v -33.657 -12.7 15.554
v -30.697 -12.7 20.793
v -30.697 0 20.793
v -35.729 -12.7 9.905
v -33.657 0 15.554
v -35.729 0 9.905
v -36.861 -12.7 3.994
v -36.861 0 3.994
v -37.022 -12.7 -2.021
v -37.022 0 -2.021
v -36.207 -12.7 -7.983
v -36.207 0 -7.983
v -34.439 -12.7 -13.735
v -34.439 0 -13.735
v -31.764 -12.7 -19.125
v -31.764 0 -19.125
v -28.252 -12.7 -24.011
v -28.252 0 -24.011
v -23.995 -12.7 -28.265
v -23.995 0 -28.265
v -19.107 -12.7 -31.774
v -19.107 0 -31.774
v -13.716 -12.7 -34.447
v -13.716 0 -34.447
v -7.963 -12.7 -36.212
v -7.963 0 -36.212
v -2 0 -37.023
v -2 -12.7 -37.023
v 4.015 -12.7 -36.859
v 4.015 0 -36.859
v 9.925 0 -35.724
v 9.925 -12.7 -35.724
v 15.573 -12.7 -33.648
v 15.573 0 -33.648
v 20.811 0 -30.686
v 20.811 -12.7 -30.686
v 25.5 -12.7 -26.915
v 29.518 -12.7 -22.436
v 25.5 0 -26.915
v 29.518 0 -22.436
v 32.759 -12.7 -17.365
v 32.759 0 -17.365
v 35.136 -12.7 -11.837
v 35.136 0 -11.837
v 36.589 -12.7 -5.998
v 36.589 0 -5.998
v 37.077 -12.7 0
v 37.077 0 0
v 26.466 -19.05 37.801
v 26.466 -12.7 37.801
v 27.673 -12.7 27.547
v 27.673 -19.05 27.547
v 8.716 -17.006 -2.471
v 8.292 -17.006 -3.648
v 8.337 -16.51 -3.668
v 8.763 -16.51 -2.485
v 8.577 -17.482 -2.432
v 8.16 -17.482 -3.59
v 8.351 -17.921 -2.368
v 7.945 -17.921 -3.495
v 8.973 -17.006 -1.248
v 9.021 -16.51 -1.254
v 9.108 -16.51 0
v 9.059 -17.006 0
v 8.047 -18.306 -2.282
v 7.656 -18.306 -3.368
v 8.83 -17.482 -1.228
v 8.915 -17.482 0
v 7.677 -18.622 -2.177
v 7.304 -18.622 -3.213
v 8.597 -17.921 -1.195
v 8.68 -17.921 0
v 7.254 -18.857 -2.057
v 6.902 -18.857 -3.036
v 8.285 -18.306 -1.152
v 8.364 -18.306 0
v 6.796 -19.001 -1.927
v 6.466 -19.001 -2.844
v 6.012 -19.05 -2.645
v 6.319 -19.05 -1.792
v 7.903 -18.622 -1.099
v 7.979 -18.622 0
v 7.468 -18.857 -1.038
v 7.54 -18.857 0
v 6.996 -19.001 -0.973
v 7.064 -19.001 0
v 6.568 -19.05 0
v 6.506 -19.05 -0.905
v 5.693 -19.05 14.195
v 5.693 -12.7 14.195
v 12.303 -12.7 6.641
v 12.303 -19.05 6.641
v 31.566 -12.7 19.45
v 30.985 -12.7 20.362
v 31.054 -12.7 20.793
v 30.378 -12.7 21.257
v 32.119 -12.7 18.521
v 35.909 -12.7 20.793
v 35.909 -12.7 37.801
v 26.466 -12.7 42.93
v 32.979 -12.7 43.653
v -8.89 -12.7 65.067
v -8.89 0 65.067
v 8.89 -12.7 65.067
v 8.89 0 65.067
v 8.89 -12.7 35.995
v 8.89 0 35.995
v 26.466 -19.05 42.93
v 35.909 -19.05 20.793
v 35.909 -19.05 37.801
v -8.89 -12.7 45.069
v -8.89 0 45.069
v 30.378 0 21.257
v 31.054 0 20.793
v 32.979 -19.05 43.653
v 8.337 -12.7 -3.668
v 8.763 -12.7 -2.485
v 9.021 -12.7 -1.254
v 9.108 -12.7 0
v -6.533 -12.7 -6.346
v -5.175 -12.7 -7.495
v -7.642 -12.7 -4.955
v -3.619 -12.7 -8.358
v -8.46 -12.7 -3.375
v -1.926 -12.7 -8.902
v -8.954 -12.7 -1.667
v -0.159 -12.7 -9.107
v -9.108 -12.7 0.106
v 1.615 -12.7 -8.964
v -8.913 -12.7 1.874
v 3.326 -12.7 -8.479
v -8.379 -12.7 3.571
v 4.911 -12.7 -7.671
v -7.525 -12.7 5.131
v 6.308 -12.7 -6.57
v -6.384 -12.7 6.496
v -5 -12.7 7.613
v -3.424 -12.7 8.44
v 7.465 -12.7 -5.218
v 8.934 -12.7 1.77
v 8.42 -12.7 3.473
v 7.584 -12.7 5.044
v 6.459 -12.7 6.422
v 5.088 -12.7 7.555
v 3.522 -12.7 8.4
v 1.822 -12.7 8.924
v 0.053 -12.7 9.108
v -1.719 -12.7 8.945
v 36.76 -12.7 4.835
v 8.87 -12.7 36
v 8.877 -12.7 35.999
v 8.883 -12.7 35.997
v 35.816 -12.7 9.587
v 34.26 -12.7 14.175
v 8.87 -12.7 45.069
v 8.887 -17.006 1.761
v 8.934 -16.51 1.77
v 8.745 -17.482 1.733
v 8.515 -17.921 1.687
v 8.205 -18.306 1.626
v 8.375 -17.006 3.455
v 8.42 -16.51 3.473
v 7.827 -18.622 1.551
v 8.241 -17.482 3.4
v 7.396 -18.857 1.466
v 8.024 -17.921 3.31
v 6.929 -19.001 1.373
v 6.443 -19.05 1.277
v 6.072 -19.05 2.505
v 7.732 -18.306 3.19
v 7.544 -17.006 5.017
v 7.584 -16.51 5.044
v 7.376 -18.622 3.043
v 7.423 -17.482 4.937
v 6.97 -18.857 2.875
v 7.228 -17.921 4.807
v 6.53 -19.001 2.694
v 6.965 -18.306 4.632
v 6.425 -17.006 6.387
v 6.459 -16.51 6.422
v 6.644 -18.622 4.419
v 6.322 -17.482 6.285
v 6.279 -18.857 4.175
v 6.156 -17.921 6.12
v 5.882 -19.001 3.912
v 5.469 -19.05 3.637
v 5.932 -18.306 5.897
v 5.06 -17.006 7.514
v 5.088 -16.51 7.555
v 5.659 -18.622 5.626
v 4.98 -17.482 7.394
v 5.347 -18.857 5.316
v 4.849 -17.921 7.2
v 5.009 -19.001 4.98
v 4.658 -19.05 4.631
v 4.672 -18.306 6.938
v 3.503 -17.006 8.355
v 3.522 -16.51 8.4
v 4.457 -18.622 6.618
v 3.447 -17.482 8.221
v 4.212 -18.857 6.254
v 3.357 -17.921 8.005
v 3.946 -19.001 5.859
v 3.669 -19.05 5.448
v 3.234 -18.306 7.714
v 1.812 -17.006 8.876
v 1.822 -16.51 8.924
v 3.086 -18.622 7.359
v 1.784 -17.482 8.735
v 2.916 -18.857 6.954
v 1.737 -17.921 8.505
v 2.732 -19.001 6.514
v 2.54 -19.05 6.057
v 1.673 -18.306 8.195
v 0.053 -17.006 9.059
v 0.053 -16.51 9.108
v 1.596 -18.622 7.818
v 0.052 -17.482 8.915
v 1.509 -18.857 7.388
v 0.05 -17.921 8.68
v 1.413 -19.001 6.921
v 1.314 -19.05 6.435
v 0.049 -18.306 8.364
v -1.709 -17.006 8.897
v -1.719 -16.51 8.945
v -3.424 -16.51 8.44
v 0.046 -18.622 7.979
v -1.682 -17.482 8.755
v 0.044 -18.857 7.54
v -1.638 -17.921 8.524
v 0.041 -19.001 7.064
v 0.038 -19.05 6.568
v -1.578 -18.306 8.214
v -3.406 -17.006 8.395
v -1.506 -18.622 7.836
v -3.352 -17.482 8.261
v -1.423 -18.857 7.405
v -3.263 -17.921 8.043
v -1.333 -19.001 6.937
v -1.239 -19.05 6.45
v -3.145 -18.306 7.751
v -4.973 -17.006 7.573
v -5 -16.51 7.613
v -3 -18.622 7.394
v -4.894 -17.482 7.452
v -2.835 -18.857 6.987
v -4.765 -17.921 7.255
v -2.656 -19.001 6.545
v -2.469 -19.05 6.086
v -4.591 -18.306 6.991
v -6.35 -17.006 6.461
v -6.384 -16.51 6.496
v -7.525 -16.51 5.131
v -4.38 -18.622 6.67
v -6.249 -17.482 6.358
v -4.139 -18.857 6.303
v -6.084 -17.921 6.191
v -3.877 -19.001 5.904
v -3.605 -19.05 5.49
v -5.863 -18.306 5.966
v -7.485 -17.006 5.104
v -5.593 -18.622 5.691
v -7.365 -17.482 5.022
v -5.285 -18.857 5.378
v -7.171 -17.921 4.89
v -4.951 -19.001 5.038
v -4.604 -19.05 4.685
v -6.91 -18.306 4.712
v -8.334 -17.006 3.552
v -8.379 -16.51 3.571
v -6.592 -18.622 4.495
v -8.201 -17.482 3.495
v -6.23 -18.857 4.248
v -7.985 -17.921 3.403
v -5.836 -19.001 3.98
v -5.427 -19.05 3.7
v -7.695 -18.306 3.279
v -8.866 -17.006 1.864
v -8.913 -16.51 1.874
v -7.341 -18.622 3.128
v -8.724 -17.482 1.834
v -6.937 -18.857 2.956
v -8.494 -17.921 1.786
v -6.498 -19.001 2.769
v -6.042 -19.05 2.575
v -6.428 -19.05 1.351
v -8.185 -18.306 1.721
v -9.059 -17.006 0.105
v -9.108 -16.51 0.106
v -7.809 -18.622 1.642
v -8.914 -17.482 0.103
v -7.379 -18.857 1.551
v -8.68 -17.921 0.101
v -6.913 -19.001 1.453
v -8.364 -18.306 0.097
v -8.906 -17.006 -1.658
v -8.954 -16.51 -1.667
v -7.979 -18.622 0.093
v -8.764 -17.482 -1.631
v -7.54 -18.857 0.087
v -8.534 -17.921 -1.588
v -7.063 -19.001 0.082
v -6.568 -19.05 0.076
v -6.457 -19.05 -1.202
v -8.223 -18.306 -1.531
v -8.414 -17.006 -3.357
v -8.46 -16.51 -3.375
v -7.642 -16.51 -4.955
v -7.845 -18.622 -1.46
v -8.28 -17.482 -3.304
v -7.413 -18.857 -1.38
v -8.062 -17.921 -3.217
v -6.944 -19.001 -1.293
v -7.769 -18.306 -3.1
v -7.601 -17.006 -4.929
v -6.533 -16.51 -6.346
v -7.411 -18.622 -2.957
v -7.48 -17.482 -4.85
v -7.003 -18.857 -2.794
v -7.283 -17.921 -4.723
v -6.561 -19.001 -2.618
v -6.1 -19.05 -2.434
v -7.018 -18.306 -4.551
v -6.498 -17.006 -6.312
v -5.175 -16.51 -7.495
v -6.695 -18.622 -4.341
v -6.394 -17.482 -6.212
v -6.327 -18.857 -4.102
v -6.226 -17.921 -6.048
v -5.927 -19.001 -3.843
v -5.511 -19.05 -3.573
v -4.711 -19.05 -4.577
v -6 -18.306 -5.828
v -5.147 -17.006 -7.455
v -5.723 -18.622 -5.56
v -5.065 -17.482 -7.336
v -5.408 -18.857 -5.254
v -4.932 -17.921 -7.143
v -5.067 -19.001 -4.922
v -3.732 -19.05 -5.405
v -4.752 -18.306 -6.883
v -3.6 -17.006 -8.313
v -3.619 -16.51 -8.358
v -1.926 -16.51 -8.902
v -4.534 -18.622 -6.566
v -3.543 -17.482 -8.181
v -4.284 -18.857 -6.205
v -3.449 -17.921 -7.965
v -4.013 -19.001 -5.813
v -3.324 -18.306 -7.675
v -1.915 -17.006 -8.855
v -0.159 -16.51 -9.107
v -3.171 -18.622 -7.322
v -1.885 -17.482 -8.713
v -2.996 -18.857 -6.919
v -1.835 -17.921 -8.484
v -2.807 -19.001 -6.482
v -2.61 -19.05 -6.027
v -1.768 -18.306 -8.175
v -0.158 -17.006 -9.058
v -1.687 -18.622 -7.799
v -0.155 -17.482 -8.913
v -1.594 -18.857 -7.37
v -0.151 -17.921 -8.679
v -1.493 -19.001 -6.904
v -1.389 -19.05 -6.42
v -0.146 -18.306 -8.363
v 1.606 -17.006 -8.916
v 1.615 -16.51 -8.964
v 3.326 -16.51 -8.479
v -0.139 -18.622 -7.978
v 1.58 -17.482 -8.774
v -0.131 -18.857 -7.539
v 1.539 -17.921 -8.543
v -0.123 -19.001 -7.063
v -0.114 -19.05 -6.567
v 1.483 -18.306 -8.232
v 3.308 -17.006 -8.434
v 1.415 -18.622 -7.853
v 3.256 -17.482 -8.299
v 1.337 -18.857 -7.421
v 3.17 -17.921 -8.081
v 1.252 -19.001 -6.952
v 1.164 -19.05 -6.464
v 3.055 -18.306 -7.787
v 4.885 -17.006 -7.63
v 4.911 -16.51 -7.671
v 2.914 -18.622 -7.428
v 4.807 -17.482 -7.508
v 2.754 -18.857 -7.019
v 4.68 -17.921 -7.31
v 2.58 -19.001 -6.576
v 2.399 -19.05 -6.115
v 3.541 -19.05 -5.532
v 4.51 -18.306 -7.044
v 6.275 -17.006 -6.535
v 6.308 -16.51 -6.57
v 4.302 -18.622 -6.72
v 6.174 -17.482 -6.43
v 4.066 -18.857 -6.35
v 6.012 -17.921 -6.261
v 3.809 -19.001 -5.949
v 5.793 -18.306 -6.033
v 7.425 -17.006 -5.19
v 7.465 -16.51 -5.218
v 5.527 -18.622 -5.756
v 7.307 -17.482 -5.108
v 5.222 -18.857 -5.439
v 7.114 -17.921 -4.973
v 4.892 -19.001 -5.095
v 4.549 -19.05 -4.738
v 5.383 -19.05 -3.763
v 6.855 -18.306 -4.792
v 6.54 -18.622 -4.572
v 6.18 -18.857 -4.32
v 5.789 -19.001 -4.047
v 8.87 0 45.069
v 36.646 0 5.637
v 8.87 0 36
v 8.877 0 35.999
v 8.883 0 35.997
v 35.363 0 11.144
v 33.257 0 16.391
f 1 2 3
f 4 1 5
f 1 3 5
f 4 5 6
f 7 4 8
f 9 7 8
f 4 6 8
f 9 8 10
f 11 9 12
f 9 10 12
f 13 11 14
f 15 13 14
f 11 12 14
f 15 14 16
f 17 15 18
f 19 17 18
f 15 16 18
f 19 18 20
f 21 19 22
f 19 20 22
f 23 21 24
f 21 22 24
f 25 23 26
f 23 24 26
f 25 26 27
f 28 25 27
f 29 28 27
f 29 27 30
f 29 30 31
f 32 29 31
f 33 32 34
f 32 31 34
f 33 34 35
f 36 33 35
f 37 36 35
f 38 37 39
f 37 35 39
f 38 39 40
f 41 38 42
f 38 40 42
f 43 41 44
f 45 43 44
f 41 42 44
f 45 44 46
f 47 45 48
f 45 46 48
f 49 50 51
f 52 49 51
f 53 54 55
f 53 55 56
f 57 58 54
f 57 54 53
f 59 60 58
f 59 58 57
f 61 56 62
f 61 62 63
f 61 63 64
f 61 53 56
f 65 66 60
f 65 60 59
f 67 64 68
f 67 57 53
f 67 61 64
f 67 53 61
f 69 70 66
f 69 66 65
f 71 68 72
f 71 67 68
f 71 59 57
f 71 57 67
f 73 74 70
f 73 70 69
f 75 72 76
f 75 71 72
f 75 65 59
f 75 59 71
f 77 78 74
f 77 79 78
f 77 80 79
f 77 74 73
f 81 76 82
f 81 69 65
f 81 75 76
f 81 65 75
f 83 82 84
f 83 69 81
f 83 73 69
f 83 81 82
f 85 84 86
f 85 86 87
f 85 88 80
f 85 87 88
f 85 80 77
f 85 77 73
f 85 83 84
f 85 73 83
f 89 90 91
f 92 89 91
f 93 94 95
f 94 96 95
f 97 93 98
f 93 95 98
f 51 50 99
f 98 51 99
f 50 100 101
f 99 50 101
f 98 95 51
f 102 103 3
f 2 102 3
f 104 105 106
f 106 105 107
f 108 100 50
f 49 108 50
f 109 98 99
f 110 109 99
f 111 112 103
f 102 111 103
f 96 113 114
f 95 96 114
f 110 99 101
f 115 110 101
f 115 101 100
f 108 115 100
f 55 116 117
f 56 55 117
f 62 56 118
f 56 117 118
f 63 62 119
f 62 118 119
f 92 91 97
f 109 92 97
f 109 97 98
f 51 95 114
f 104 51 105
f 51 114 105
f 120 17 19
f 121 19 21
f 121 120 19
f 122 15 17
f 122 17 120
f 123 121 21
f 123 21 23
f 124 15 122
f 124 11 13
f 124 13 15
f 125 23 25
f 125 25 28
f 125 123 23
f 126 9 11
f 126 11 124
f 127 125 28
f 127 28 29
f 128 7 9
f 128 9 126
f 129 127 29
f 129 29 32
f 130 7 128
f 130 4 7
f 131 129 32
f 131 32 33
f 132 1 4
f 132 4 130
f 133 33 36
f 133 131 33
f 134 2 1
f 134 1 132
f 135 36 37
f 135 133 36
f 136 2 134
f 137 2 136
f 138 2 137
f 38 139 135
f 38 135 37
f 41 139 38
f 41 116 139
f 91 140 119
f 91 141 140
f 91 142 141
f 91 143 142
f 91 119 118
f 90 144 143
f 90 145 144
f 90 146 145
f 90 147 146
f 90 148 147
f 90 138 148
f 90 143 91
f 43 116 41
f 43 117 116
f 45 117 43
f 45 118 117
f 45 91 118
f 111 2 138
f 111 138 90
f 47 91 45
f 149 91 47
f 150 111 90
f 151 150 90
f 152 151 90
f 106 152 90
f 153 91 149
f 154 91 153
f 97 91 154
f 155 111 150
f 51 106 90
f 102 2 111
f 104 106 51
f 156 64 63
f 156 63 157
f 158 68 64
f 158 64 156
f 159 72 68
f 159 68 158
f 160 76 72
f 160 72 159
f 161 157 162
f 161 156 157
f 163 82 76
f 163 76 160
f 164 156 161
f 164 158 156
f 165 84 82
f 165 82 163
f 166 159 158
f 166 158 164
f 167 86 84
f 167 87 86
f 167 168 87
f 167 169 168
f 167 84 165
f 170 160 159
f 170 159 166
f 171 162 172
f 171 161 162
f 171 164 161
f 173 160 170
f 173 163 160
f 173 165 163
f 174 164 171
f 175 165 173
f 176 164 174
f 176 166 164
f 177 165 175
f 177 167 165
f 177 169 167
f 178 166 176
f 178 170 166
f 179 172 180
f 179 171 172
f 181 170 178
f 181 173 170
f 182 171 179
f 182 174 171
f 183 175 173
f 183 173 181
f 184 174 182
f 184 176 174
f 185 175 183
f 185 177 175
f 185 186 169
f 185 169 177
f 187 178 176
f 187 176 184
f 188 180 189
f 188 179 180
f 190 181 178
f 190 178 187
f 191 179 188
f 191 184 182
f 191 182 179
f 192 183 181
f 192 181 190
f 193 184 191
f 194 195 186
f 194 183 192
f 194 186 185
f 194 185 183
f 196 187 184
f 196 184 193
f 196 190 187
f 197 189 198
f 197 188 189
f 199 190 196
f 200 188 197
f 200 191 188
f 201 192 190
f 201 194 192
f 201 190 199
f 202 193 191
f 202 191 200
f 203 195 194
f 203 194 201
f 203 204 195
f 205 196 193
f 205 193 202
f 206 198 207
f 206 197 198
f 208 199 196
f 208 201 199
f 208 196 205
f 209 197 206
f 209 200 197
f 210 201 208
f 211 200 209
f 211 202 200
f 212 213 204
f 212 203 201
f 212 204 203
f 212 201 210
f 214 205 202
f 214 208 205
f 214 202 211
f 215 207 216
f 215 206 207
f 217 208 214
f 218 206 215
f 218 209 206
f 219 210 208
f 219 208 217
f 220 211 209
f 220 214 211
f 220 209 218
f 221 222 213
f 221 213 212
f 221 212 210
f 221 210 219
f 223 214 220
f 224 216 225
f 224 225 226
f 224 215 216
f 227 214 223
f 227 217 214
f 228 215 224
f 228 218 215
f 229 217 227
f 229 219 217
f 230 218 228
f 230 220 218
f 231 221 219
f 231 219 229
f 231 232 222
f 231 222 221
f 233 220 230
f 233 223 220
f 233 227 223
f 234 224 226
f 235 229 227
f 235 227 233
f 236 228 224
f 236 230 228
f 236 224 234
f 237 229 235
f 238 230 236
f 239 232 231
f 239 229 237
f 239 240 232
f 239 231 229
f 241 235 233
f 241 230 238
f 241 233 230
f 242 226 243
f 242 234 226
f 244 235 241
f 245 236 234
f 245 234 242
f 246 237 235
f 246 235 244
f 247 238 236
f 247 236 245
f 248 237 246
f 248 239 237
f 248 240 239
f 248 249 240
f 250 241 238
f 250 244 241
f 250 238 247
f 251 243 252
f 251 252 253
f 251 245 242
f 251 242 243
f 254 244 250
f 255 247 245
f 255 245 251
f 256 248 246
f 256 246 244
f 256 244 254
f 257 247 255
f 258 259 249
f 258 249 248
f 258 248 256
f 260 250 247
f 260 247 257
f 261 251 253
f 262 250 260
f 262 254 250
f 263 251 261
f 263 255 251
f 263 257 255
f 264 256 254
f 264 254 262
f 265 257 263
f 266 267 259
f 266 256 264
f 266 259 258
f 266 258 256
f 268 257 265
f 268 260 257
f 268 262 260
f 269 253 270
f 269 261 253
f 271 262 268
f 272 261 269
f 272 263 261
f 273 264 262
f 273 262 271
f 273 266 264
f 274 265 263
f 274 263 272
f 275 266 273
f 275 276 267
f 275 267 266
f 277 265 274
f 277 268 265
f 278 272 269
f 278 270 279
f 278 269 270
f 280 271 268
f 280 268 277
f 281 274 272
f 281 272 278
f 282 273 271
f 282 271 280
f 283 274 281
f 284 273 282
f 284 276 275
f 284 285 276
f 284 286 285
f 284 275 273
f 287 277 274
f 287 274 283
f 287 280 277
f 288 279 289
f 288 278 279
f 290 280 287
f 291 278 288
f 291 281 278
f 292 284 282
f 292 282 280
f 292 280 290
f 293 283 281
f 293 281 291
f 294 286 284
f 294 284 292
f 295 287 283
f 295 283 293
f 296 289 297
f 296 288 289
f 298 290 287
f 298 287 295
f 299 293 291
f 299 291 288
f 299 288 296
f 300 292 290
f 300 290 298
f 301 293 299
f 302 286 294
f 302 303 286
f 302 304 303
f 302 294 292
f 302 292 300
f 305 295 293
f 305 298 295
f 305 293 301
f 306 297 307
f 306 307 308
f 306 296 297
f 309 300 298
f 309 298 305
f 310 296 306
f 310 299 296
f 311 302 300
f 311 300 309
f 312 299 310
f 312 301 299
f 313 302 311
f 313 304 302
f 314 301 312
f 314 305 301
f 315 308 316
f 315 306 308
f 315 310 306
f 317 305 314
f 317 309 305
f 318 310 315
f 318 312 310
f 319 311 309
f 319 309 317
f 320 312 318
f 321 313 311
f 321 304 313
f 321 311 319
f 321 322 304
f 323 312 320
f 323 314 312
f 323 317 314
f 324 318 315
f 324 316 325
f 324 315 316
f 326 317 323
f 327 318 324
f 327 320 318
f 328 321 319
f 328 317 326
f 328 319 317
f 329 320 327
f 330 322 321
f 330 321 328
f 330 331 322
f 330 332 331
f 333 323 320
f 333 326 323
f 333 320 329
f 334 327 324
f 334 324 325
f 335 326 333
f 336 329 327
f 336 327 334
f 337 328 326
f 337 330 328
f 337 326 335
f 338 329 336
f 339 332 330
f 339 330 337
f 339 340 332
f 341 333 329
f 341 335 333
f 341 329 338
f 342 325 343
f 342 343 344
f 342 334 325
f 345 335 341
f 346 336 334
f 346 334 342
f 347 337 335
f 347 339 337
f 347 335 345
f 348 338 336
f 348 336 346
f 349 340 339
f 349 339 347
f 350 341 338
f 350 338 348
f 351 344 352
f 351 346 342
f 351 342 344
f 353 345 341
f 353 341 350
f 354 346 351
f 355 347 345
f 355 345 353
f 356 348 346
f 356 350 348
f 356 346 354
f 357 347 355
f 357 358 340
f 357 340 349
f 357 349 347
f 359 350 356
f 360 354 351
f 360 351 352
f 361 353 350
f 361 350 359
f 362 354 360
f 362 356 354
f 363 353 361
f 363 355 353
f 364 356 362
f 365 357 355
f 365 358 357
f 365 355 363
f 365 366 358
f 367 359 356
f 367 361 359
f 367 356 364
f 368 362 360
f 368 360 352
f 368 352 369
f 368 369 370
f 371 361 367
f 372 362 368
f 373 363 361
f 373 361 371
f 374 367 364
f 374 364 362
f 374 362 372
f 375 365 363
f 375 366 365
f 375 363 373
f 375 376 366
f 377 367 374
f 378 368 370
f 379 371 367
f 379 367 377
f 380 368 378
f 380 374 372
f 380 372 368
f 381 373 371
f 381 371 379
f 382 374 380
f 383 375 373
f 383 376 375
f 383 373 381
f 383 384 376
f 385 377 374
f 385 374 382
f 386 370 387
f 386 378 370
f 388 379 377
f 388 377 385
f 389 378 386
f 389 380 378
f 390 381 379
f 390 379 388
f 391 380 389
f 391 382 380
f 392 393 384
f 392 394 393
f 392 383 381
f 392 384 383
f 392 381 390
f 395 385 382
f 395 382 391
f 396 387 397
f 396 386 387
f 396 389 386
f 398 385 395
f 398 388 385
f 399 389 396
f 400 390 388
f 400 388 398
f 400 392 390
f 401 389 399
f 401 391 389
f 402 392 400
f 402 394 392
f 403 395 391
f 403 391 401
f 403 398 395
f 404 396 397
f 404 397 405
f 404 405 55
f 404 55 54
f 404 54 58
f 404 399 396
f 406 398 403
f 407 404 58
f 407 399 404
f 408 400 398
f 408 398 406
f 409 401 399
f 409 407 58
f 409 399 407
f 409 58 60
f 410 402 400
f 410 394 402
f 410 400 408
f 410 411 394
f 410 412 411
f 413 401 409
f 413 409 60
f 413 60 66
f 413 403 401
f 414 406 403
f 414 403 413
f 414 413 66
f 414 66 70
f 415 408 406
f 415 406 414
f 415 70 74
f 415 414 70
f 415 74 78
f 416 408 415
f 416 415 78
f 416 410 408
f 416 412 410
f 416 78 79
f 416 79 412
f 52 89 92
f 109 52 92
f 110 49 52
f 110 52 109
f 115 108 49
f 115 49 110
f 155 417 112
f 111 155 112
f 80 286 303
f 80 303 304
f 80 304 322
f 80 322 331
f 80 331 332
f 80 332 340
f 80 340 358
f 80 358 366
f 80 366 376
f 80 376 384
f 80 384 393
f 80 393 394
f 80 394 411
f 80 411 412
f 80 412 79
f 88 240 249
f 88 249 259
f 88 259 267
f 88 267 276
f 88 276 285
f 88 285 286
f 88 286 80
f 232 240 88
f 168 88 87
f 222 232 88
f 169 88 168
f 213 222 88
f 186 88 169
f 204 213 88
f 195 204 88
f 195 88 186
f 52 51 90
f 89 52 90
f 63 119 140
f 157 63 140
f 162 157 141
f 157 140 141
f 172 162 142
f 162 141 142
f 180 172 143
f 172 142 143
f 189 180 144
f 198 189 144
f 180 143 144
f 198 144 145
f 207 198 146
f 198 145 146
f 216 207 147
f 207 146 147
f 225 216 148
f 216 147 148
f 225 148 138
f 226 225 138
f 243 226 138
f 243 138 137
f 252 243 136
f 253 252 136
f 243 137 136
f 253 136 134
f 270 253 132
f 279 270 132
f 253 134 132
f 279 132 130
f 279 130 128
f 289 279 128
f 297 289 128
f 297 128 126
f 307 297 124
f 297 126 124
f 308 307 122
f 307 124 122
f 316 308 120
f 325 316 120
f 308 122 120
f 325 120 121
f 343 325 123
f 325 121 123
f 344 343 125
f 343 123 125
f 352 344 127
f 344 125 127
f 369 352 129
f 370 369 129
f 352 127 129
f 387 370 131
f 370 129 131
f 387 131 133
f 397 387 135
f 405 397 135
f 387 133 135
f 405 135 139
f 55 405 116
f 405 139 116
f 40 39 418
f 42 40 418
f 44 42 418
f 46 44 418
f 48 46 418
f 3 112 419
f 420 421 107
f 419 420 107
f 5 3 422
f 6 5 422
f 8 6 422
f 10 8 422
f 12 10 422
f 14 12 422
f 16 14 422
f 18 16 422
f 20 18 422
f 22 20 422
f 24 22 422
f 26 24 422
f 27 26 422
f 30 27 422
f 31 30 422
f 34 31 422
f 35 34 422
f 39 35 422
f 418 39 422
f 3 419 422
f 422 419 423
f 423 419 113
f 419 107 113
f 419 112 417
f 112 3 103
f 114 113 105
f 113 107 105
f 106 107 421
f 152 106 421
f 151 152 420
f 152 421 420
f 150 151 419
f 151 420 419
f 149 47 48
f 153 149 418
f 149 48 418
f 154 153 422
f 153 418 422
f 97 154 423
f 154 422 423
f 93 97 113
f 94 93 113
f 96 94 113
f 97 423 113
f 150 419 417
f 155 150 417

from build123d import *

# Parameters (mm, degrees)
F1_DEPTH = 12.7
F3_DEPTH = 6.35
F4_R     = 2.54


with BuildPart() as f1:
    # F0 (on Front) → F1 (new body)
    with BuildSketch(Plane.XZ):
        with BuildLine():
            Line((-8.89, 0), (-8.89, 35.995271902))
            ThreePointArc((-8.89, 35.995271902), (-21.2029287752, 30.4159088415), (-30.6973562447, 20.7933647802))
            ThreePointArc((-30.6973562447, 20.7933647802), (-10.8749915983, -35.4461035522), (37.0768350766, 0))
            ThreePointArc((37.0768350766, 0), (35.3625750984, 11.1436072124), (30.3783139408, 21.256757547))
            Line((30.3783139408, 21.256757547), (8.89, 35.995271902))
            ThreePointArc((8.89, 35.995271902), (8.8799379581, 35.9977555017), (8.8698752224, 36.0002362886))
            Line((8.8698752224, 36.0002362886), (8.8698752224, 0))
            Line((8.8698752224, 0), (-8.89, 0))
        make_face()
        with BuildLine():
            ThreePointArc((-30.6973562447, 20.7933647802), (-21.2029287752, 30.4159088415), (-8.89, 35.995271902))
            Line((-8.89, 35.995271902), (-8.89, 45.0685620308))
            Line((-8.89, 45.0685620308), (-8.89, 65.0674526496))
            Line((-8.89, 65.0674526496), (-30.6973562447, 20.7933647802))
        make_face()
        with BuildLine():
            Line((-8.89, 45.0685620308), (-8.89, 35.995271902))
            ThreePointArc((-8.89, 35.995271902), (-0.010364022, 37.0768336281), (8.8698752224, 36.0002362886))
            Line((8.8698752224, 36.0002362886), (8.8698752224, 45.0685620308))
            Line((8.8698752224, 45.0685620308), (-8.89, 45.0685620308))
        make_face()
        with BuildLine():
            ThreePointArc((8.8698752224, 36.0002362886), (-0.010364022, 37.0768336281), (-8.89, 35.995271902))
            Line((-8.89, 35.995271902), (-8.89, 0))
            Line((-8.89, 0), (8.8698752224, 0))
            Line((8.8698752224, 0), (8.8698752224, 36.0002362886))
        make_face()
        with BuildLine():
            Line((8.89, 65.0674526496), (8.89, 35.995271902))
            ThreePointArc((8.89, 35.995271902), (20.9715538596, 30.5758994636), (30.3783139408, 21.256757547))
            Line((30.3783139408, 21.256757547), (31.053926761, 20.7933647802))
            Line((31.053926761, 20.7933647802), (8.89, 65.0674526496))
        make_face()
        with BuildLine():
            ThreePointArc((30.3783139408, 21.256757547), (20.9715538596, 30.5758994636), (8.89, 35.995271902))
            Line((8.89, 35.995271902), (30.3783139408, 21.256757547))
        make_face()
    extrude(amount=F1_DEPTH)

    # F2 (on face) → F3 (join)
    with BuildSketch(Plane.XZ.offset(12.7)):
        with BuildLine():
            Line((8.3370473279, -3.6677770405), (9.1081802006, 0))
            ThreePointArc((9.1081802006, 0), (-8.9133124025, 1.8739820121), (8.3370473279, -3.6677770405))
        make_face()
        with BuildLine():
            ThreePointArc((8.3370473279, -3.6677770405), (8.9133124025, -1.8739820121), (9.1081802006, 0))
            Line((9.1081802006, 0), (8.3370473279, -3.6677770405))
        make_face()
        Polygon((27.6729999866, 27.547016816), (5.6928377599, 14.1950091347), (12.3025802895, 6.641021464), (35.9087884426, 20.7933647802), align=None)
        Polygon((26.466306299, 37.8012210131), (27.6729999866, 27.547016816), (35.9087884426, 20.7933647802), (35.9087884426, 37.8012210131), (32.9793743131, 43.6529430466), (26.466306299, 42.9304087149), align=None)
    extrude(amount=F3_DEPTH)

    # F4
    f4_edges = [f1.edges().sort_by_distance(p)[0] for p in [
        (-8.337047, -19.05, 3.667777),
    ]]
    fillet(f4_edges, radius=F4_R)


solid = f1.part
